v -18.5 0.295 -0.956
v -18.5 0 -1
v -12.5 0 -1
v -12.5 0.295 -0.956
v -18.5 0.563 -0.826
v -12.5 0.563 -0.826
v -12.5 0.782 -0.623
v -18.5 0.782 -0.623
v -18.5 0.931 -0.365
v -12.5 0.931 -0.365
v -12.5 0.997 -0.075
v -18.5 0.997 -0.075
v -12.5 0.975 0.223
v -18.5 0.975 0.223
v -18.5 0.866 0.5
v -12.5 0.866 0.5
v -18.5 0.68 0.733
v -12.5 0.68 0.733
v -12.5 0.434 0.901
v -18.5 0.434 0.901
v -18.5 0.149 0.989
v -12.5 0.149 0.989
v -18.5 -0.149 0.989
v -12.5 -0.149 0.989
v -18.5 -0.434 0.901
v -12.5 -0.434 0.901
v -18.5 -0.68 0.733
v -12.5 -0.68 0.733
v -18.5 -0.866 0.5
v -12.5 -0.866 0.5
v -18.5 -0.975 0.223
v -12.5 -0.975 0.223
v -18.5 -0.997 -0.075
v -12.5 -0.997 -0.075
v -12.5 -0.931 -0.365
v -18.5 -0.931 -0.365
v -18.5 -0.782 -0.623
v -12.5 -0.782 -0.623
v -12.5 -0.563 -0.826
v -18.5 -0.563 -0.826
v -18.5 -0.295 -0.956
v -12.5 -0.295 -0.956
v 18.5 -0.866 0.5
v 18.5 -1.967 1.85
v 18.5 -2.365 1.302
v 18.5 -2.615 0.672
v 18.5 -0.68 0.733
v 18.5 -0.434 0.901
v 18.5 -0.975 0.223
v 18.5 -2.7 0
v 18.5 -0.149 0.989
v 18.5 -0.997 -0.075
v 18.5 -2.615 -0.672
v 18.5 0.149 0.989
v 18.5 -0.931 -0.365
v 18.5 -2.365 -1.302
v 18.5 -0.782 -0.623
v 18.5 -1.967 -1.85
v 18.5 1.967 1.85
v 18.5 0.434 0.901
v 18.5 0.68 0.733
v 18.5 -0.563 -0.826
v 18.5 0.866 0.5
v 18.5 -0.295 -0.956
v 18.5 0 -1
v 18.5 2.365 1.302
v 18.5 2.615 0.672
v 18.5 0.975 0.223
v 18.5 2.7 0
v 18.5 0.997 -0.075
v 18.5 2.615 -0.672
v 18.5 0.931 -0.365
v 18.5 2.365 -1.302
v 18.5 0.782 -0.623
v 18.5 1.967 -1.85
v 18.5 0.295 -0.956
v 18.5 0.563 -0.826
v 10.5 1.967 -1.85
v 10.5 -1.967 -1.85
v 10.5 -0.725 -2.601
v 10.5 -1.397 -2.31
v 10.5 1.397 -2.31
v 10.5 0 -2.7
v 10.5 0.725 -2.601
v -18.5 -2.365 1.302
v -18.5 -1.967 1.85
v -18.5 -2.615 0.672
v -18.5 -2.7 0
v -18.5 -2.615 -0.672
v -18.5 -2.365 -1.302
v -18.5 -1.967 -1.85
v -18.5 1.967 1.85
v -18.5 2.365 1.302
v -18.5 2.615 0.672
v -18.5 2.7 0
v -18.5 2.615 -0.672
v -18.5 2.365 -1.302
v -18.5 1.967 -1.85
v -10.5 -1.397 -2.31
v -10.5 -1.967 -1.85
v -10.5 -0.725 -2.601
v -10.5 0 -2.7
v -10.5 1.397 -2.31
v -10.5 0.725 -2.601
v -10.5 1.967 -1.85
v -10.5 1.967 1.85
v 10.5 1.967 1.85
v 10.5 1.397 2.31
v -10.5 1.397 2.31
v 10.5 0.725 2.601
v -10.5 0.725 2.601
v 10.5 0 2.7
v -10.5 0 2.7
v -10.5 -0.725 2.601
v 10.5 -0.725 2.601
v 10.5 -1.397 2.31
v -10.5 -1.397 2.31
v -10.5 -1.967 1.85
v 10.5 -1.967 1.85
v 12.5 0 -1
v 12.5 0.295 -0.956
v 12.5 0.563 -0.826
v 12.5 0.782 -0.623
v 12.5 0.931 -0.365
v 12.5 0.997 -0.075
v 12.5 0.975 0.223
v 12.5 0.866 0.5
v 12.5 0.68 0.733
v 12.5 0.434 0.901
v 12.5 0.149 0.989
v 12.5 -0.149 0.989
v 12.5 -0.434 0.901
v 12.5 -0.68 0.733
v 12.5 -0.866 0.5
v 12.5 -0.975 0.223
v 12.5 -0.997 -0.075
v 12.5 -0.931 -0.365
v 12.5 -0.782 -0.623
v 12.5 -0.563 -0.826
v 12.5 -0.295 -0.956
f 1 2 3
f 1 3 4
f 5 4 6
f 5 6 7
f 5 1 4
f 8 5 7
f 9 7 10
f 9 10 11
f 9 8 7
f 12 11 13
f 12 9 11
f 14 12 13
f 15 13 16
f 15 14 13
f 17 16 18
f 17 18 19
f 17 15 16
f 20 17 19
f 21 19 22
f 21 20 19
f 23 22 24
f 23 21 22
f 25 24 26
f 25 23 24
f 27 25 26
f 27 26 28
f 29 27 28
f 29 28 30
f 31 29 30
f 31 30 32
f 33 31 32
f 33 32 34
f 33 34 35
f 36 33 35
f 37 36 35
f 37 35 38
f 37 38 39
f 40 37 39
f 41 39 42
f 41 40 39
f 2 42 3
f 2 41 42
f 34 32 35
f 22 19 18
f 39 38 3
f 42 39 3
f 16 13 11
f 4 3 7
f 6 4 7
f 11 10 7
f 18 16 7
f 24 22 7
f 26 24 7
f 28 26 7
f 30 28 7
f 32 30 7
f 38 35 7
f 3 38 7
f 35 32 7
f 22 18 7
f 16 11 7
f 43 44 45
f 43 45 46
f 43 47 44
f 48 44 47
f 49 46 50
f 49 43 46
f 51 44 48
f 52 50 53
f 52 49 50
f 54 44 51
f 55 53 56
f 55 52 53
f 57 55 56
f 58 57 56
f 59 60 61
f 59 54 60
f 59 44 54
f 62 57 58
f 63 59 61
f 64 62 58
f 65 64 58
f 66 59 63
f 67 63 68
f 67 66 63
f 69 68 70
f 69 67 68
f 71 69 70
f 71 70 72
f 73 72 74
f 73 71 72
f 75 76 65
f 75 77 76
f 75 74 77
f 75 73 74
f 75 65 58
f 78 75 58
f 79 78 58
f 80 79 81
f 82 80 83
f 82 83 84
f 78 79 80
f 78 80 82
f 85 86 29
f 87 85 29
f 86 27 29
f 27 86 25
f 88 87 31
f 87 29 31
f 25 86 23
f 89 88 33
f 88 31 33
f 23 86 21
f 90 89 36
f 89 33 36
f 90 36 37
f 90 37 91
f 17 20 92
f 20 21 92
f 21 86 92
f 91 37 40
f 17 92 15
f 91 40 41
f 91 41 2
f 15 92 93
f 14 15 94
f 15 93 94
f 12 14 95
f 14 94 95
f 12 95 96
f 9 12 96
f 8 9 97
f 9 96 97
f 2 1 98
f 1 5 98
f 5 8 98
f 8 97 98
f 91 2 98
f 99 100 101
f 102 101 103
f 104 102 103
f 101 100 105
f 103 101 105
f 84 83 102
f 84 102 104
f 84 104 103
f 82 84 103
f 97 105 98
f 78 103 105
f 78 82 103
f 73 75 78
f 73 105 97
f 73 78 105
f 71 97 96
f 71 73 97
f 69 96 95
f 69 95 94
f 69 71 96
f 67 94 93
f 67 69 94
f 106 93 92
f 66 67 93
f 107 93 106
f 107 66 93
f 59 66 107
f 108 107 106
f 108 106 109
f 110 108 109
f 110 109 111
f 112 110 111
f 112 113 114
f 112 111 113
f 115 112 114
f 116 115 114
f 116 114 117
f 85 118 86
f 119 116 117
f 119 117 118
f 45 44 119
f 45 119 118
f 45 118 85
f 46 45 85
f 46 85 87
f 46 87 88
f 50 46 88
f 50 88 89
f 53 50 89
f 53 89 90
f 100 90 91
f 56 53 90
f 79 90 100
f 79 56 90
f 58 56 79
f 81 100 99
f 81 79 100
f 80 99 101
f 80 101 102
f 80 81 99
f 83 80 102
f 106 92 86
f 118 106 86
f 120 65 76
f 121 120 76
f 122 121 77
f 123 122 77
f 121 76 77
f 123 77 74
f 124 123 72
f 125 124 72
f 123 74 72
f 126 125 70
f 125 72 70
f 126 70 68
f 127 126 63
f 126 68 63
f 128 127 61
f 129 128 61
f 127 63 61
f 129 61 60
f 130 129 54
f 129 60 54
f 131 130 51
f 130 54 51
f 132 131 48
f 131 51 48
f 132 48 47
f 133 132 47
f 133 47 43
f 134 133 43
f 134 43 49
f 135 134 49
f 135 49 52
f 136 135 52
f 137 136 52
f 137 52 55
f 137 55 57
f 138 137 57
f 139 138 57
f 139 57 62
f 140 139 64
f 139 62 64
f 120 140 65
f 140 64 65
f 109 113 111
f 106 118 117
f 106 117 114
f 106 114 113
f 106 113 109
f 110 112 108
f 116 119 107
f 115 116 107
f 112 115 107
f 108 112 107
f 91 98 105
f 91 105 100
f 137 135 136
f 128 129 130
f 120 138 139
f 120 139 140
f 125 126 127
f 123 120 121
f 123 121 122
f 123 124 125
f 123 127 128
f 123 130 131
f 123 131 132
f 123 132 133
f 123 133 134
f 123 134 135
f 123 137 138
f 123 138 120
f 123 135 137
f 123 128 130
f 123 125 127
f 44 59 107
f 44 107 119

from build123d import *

# Parameters (mm, degrees)
SKETCH1_R           = 2.7
BOSS_EXTRUDE1_DEPTH = 18.5
CUT_EXTRUDE1_DEPTH  = 8
SKETCH3_R           = 1
CUT_EXTRUDE2_DEPTH  = 6


with BuildPart() as part:
    # Sketch1 → Boss-Extrude1 (new body, symmetric)
    with BuildSketch(Plane(origin=(0, 0, 0), x_dir=(0, 0, -1), z_dir=(1, 0, 0))):
        Circle(SKETCH1_R)
    extrude(amount=BOSS_EXTRUDE1_DEPTH, both=True)

    # Sketch2 → Cut-Extrude1 (cut)
    with BuildSketch(Plane(origin=(18.5, 0, 0), x_dir=(0, 0, -1), z_dir=(1, 0, 0))):
        with BuildLine():
            Line((-1.85, 1.966596044), (-1.85, -1.966596044))
            ThreePointArc((-1.85, -1.966596044), (-2.7, 0), (-1.85, 1.966596044))
        make_face()
        with BuildLine():
            Line((1.85, 1.966596044), (1.85, -1.966596044))
            ThreePointArc((1.85, -1.966596044), (2.7, 0), (1.85, 1.966596044))
        make_face()
    cut_extrude1 = extrude(amount=-CUT_EXTRUDE1_DEPTH, mode=Mode.SUBTRACT)

    # Sketch3 → Cut-Extrude2 (cut)
    with BuildSketch(Plane(origin=(18.5, 0, 0), x_dir=(0, 0, -1), z_dir=(1, 0, 0))):
        Circle(SKETCH3_R)
    cut_extrude2 = extrude(amount=-CUT_EXTRUDE2_DEPTH, mode=Mode.SUBTRACT)

    # Mirror1: Cut-Extrude1, Cut-Extrude2 across plane
    add(cut_extrude1.mirror(Plane(origin=(0, 0, 0), x_dir=(0, 0, 1), z_dir=(1, 0, 0))), mode=Mode.SUBTRACT)
    add(cut_extrude2.mirror(Plane(origin=(0, 0, 0), x_dir=(0, 0, 1), z_dir=(1, 0, 0))), mode=Mode.SUBTRACT)


solid = part.part
